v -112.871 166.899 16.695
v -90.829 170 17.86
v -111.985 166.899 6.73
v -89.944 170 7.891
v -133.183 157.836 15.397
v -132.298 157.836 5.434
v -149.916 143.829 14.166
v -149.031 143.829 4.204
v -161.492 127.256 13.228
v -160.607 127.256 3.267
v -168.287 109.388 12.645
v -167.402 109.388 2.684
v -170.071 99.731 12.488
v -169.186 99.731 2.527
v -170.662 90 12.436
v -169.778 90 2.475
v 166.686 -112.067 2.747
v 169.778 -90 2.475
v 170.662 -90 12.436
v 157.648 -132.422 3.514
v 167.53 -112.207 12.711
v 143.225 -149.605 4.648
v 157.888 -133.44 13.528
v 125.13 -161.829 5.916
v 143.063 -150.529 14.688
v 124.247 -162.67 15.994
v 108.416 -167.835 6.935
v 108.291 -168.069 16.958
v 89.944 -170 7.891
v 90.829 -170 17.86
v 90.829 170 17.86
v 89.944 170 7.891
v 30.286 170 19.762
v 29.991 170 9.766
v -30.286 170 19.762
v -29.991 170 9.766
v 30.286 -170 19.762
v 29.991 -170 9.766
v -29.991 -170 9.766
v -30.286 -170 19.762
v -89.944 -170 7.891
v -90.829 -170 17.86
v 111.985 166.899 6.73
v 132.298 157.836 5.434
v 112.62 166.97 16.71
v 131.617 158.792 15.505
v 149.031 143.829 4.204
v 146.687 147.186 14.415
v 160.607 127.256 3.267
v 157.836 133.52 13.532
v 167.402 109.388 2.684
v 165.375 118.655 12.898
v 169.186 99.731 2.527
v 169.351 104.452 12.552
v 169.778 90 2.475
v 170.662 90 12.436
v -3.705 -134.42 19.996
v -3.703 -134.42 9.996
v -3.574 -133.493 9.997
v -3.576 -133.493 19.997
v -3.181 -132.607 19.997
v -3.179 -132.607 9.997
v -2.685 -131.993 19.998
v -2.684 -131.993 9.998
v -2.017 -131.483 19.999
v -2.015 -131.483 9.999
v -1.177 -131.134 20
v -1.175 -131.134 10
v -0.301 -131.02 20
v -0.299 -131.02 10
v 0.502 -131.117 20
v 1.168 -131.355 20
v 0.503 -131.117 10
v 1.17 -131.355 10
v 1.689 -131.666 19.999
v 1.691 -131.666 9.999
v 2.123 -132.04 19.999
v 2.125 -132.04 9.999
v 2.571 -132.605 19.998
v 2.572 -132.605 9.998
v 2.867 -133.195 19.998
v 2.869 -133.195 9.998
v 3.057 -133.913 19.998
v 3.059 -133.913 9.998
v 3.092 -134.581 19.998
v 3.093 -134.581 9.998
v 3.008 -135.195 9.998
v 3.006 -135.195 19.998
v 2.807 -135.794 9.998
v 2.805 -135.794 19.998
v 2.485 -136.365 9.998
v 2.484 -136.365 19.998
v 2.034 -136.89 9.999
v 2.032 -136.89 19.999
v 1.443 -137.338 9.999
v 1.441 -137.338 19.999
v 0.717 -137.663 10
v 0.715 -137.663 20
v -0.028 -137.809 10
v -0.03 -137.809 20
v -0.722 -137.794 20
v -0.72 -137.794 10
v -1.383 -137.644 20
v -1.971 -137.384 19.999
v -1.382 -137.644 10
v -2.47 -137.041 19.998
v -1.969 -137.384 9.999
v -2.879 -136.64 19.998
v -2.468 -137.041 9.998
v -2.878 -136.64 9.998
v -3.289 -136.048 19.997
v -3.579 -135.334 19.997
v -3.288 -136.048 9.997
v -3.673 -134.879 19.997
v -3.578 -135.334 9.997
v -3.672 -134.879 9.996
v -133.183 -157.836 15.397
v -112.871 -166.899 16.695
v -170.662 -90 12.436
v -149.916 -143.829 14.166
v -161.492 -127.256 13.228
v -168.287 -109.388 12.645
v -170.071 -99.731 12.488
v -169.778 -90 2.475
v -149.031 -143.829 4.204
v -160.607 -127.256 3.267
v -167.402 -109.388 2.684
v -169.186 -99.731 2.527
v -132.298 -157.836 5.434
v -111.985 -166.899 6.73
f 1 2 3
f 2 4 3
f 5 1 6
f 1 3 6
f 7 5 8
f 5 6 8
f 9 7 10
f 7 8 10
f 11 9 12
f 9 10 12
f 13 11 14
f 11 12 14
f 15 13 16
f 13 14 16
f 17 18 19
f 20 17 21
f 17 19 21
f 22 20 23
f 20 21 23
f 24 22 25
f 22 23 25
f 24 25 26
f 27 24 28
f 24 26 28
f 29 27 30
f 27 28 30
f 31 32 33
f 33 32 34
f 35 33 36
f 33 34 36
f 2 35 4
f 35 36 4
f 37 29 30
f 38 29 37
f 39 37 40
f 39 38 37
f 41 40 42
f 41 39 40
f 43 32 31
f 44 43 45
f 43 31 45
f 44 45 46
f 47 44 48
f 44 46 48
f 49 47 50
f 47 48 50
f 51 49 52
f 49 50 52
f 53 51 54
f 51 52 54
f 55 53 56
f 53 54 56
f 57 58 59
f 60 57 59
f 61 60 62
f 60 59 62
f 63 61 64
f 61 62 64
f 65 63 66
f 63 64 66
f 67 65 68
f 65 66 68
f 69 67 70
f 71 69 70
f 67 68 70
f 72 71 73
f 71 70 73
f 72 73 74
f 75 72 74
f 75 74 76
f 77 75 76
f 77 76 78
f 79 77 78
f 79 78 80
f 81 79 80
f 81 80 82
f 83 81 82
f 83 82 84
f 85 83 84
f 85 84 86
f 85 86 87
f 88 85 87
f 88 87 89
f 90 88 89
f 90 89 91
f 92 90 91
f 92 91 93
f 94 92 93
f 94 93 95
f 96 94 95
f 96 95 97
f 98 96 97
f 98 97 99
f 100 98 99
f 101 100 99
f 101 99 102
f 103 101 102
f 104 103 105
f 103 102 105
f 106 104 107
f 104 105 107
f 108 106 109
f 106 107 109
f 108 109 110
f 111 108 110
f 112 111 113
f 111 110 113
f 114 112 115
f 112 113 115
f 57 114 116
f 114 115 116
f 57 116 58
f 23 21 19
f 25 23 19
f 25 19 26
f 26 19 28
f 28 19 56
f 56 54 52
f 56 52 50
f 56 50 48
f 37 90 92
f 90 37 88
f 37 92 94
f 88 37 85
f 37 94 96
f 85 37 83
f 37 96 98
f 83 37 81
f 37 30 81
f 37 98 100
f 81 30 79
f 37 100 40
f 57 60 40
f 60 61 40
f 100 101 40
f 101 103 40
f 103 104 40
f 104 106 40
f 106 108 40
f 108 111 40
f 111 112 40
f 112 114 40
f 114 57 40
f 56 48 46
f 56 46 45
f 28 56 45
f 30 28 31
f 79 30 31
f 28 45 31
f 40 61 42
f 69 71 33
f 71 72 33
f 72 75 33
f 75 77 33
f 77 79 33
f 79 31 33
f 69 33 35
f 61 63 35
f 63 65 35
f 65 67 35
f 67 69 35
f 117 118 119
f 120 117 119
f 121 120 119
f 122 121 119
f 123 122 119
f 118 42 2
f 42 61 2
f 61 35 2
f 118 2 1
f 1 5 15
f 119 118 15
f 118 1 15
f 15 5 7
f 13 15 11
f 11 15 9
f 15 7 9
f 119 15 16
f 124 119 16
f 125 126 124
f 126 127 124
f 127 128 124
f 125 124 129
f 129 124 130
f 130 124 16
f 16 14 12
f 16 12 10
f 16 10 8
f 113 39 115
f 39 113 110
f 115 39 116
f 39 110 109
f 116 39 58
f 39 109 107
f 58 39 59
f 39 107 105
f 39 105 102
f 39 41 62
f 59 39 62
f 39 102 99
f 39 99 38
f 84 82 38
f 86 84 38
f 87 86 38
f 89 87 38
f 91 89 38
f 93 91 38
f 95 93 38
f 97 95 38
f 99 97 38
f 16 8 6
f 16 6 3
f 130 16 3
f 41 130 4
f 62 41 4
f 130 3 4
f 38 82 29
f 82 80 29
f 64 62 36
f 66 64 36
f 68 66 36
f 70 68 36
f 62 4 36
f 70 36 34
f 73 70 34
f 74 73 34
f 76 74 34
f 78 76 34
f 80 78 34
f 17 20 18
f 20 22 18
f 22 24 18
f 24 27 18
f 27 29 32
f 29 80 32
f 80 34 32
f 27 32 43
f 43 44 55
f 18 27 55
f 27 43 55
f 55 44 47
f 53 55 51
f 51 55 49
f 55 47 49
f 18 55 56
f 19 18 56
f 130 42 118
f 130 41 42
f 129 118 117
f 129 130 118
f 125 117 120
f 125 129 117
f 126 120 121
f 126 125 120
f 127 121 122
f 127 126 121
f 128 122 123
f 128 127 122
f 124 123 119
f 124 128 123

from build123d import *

# Parameters (mm, degrees)
LINEAR_AUSTRAGEN_D_NN1_DEPTH      = 170
LINEAR_AUSTRAGEN_D_NN1_DEPTH_BACK = 170
VERRUNDUNG1_R                     = 80
F_6_8_6_8_DURCHMESSER_BOHRUNG1_D  = 6.8


with BuildPart() as part:
    # Skizze2 → Linear-Austragen-Dünn1 (new body, two sides)
    with BuildSketch(Plane(origin=(0, 0, 0), x_dir=(1, 0, 0), z_dir=(0, 1, 0))) as linear_austragen_d_nn1_sk:
        with BuildLine():
            ThreePointArc((-169.777732917, -2.47495966), (0, -10), (169.777732917, -2.47495966))
            Line((169.777732917, -2.47495966), (170.662452734, -12.435746318))
            ThreePointArc((170.662452734, -12.435746318), (0, -20), (-170.662452734, -12.435746318))
            Line((-170.662452734, -12.435746318), (-169.777732917, -2.47495966))
        make_face()
    extrude(amount=LINEAR_AUSTRAGEN_D_NN1_DEPTH)
    extrude(linear_austragen_d_nn1_sk.sketch, amount=-LINEAR_AUSTRAGEN_D_NN1_DEPTH_BACK)

    # Verrundung1
    verrundung1_edges = [part.edges().sort_by_distance(p)[0] for p in [
        (170.220092826, 170, 7.455352989),
        (-170.220092826, 170, 7.455352989),
        (-170.220092826, -170, 7.455352989),
        (170.220092826, -170, 7.455352989),
    ]]
    fillet(verrundung1_edges, radius=VERRUNDUNG1_R)

    # Ø6.8 (6.8) Durchmesser Bohrung1 (through all)
    with Locations(Plane(origin=(-0.304533865, -134.419932379, 19.999975961), x_dir=(0.999999988, 0, 0.000157871), z_dir=(-0.000157871, 0, 0.999999988))):
        with Locations((0, 0)):
            Hole(F_6_8_6_8_DURCHMESSER_BOHRUNG1_D / 2)


solid = part.part
